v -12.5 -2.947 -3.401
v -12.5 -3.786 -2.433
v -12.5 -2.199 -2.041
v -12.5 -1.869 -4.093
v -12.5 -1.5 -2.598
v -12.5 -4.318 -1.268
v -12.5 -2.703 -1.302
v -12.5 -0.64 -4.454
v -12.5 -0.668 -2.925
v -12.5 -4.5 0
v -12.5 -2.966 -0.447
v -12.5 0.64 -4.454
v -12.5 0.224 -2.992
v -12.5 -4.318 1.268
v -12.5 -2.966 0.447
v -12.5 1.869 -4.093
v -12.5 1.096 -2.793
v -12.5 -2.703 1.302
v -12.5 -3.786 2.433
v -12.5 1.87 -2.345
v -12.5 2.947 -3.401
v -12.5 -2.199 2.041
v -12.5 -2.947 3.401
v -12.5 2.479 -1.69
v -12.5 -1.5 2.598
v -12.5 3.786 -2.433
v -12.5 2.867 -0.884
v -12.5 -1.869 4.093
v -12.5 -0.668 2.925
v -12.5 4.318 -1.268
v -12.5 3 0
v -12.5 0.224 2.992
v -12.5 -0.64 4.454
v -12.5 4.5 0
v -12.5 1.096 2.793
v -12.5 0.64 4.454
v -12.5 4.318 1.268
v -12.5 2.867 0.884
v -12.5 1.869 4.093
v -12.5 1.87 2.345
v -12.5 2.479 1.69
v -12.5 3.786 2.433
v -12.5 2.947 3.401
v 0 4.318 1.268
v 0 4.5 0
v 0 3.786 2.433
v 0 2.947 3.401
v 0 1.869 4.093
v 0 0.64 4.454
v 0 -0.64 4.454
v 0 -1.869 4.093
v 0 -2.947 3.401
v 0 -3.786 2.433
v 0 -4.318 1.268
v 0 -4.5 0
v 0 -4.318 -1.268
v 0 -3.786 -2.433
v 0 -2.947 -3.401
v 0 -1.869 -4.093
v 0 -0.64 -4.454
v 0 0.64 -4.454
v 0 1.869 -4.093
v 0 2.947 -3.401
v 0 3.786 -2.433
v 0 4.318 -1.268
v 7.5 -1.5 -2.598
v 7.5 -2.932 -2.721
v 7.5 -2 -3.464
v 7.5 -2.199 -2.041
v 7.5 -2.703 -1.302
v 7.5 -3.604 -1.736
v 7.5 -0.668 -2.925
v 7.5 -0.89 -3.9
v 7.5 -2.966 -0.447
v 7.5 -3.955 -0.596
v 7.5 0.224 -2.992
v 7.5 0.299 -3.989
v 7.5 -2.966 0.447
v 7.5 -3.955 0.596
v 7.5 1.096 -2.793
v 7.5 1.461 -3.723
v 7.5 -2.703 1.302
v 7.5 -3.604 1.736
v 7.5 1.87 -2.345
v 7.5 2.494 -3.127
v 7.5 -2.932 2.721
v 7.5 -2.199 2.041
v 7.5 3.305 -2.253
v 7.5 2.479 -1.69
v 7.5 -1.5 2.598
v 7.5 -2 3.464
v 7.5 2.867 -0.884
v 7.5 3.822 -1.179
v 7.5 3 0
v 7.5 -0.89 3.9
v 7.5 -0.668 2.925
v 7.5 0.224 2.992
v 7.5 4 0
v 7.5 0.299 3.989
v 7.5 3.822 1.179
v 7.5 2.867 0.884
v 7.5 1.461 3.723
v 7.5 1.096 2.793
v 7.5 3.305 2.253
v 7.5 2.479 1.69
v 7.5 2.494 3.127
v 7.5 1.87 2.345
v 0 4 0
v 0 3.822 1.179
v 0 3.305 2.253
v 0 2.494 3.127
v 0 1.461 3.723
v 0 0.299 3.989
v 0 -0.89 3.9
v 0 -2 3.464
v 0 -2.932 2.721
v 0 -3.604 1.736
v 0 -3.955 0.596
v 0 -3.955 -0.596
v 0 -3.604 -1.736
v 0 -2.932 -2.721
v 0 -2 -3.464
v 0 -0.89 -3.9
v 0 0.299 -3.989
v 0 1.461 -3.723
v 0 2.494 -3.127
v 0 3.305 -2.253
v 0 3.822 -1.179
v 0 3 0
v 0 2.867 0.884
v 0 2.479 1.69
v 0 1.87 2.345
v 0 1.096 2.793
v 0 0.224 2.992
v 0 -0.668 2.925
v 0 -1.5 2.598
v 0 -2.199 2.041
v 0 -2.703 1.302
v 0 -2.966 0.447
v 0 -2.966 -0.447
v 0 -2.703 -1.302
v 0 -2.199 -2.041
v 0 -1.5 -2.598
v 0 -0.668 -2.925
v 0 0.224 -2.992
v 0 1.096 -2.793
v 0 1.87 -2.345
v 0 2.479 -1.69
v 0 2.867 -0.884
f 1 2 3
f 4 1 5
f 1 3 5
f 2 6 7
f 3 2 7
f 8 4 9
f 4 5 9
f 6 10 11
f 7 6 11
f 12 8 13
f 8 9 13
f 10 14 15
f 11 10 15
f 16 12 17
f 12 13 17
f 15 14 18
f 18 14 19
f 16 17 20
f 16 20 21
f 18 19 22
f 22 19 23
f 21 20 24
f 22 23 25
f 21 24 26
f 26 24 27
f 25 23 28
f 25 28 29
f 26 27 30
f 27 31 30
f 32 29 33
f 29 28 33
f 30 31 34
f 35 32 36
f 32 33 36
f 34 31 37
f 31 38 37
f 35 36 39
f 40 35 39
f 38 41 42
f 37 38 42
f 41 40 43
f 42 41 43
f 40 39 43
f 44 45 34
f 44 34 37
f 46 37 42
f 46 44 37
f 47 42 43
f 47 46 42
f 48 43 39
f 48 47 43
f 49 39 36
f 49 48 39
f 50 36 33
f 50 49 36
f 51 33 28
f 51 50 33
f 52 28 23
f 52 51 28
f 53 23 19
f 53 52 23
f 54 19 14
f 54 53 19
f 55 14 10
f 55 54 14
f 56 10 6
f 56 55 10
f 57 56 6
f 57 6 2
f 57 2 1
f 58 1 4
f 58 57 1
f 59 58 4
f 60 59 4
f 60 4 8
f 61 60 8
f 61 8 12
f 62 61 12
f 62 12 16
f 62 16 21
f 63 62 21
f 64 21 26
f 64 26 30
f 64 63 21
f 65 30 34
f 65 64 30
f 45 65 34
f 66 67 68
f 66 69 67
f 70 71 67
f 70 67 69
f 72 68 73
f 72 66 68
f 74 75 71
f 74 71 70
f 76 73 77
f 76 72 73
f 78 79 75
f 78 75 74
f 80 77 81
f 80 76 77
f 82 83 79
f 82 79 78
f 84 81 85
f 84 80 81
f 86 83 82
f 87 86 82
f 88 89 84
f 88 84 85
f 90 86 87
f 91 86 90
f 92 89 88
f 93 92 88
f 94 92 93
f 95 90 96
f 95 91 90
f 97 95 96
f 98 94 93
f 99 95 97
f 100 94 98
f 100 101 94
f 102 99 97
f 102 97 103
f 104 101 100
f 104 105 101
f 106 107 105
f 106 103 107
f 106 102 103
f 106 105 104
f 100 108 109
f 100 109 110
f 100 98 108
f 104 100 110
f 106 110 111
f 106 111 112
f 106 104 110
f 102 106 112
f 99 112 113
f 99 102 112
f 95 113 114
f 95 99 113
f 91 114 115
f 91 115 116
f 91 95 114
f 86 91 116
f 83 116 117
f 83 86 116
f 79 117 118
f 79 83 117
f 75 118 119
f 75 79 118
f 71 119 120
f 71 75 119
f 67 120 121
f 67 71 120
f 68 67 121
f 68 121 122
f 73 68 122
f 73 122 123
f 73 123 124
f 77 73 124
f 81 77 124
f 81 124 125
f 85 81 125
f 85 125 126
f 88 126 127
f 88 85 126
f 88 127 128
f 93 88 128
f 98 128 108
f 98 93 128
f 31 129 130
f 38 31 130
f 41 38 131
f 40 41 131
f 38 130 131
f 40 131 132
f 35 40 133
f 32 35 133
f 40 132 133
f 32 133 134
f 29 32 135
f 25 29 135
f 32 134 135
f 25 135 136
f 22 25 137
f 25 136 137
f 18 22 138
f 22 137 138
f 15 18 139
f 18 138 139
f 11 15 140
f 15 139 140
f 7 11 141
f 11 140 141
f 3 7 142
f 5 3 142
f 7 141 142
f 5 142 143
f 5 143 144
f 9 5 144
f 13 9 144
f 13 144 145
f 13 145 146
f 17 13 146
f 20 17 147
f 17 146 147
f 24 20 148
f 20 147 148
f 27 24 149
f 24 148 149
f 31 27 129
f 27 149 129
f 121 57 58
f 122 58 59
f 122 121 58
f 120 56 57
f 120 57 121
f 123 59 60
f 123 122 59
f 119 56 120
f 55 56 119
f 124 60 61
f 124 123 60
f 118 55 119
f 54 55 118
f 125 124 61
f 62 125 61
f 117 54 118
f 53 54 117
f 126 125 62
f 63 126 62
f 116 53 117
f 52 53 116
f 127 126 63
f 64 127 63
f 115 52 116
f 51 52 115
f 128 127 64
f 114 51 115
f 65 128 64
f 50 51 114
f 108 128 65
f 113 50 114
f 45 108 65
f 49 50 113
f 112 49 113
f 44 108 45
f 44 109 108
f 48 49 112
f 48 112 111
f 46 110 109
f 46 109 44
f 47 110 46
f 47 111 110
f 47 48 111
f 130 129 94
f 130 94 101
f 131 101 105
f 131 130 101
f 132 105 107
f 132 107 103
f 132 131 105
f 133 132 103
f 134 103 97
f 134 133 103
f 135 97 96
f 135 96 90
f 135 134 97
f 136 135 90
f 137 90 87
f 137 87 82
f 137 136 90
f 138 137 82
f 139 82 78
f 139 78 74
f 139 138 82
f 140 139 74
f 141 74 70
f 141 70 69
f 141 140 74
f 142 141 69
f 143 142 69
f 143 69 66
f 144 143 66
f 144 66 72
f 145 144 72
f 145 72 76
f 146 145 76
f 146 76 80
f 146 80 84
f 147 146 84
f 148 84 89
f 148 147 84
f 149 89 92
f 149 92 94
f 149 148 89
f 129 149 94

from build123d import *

# Parameters (mm, degrees)
F0_R          = 4
F0_R_2        = 3
F1_DEPTH      = 7.5
F1_DEPTH_BACK = 12.5
F0_R_3        = 4.5
F2_DEPTH      = 12.5


with BuildPart() as f1:
    # F0 (on Right) → F1 (new body, two sides)
    with BuildSketch(Plane.YZ) as f1_sk:
        Circle(F0_R)
        Circle(F0_R_2, mode=Mode.SUBTRACT)
    extrude(amount=F1_DEPTH)
    extrude(f1_sk.sketch, amount=-F1_DEPTH_BACK)

    # F0 (on Right) → F2 (join)
    with BuildSketch(Plane.YZ):
        Circle(F0_R_3)
        Circle(F0_R, mode=Mode.SUBTRACT)
    extrude(amount=-F2_DEPTH)


solid = f1.part
